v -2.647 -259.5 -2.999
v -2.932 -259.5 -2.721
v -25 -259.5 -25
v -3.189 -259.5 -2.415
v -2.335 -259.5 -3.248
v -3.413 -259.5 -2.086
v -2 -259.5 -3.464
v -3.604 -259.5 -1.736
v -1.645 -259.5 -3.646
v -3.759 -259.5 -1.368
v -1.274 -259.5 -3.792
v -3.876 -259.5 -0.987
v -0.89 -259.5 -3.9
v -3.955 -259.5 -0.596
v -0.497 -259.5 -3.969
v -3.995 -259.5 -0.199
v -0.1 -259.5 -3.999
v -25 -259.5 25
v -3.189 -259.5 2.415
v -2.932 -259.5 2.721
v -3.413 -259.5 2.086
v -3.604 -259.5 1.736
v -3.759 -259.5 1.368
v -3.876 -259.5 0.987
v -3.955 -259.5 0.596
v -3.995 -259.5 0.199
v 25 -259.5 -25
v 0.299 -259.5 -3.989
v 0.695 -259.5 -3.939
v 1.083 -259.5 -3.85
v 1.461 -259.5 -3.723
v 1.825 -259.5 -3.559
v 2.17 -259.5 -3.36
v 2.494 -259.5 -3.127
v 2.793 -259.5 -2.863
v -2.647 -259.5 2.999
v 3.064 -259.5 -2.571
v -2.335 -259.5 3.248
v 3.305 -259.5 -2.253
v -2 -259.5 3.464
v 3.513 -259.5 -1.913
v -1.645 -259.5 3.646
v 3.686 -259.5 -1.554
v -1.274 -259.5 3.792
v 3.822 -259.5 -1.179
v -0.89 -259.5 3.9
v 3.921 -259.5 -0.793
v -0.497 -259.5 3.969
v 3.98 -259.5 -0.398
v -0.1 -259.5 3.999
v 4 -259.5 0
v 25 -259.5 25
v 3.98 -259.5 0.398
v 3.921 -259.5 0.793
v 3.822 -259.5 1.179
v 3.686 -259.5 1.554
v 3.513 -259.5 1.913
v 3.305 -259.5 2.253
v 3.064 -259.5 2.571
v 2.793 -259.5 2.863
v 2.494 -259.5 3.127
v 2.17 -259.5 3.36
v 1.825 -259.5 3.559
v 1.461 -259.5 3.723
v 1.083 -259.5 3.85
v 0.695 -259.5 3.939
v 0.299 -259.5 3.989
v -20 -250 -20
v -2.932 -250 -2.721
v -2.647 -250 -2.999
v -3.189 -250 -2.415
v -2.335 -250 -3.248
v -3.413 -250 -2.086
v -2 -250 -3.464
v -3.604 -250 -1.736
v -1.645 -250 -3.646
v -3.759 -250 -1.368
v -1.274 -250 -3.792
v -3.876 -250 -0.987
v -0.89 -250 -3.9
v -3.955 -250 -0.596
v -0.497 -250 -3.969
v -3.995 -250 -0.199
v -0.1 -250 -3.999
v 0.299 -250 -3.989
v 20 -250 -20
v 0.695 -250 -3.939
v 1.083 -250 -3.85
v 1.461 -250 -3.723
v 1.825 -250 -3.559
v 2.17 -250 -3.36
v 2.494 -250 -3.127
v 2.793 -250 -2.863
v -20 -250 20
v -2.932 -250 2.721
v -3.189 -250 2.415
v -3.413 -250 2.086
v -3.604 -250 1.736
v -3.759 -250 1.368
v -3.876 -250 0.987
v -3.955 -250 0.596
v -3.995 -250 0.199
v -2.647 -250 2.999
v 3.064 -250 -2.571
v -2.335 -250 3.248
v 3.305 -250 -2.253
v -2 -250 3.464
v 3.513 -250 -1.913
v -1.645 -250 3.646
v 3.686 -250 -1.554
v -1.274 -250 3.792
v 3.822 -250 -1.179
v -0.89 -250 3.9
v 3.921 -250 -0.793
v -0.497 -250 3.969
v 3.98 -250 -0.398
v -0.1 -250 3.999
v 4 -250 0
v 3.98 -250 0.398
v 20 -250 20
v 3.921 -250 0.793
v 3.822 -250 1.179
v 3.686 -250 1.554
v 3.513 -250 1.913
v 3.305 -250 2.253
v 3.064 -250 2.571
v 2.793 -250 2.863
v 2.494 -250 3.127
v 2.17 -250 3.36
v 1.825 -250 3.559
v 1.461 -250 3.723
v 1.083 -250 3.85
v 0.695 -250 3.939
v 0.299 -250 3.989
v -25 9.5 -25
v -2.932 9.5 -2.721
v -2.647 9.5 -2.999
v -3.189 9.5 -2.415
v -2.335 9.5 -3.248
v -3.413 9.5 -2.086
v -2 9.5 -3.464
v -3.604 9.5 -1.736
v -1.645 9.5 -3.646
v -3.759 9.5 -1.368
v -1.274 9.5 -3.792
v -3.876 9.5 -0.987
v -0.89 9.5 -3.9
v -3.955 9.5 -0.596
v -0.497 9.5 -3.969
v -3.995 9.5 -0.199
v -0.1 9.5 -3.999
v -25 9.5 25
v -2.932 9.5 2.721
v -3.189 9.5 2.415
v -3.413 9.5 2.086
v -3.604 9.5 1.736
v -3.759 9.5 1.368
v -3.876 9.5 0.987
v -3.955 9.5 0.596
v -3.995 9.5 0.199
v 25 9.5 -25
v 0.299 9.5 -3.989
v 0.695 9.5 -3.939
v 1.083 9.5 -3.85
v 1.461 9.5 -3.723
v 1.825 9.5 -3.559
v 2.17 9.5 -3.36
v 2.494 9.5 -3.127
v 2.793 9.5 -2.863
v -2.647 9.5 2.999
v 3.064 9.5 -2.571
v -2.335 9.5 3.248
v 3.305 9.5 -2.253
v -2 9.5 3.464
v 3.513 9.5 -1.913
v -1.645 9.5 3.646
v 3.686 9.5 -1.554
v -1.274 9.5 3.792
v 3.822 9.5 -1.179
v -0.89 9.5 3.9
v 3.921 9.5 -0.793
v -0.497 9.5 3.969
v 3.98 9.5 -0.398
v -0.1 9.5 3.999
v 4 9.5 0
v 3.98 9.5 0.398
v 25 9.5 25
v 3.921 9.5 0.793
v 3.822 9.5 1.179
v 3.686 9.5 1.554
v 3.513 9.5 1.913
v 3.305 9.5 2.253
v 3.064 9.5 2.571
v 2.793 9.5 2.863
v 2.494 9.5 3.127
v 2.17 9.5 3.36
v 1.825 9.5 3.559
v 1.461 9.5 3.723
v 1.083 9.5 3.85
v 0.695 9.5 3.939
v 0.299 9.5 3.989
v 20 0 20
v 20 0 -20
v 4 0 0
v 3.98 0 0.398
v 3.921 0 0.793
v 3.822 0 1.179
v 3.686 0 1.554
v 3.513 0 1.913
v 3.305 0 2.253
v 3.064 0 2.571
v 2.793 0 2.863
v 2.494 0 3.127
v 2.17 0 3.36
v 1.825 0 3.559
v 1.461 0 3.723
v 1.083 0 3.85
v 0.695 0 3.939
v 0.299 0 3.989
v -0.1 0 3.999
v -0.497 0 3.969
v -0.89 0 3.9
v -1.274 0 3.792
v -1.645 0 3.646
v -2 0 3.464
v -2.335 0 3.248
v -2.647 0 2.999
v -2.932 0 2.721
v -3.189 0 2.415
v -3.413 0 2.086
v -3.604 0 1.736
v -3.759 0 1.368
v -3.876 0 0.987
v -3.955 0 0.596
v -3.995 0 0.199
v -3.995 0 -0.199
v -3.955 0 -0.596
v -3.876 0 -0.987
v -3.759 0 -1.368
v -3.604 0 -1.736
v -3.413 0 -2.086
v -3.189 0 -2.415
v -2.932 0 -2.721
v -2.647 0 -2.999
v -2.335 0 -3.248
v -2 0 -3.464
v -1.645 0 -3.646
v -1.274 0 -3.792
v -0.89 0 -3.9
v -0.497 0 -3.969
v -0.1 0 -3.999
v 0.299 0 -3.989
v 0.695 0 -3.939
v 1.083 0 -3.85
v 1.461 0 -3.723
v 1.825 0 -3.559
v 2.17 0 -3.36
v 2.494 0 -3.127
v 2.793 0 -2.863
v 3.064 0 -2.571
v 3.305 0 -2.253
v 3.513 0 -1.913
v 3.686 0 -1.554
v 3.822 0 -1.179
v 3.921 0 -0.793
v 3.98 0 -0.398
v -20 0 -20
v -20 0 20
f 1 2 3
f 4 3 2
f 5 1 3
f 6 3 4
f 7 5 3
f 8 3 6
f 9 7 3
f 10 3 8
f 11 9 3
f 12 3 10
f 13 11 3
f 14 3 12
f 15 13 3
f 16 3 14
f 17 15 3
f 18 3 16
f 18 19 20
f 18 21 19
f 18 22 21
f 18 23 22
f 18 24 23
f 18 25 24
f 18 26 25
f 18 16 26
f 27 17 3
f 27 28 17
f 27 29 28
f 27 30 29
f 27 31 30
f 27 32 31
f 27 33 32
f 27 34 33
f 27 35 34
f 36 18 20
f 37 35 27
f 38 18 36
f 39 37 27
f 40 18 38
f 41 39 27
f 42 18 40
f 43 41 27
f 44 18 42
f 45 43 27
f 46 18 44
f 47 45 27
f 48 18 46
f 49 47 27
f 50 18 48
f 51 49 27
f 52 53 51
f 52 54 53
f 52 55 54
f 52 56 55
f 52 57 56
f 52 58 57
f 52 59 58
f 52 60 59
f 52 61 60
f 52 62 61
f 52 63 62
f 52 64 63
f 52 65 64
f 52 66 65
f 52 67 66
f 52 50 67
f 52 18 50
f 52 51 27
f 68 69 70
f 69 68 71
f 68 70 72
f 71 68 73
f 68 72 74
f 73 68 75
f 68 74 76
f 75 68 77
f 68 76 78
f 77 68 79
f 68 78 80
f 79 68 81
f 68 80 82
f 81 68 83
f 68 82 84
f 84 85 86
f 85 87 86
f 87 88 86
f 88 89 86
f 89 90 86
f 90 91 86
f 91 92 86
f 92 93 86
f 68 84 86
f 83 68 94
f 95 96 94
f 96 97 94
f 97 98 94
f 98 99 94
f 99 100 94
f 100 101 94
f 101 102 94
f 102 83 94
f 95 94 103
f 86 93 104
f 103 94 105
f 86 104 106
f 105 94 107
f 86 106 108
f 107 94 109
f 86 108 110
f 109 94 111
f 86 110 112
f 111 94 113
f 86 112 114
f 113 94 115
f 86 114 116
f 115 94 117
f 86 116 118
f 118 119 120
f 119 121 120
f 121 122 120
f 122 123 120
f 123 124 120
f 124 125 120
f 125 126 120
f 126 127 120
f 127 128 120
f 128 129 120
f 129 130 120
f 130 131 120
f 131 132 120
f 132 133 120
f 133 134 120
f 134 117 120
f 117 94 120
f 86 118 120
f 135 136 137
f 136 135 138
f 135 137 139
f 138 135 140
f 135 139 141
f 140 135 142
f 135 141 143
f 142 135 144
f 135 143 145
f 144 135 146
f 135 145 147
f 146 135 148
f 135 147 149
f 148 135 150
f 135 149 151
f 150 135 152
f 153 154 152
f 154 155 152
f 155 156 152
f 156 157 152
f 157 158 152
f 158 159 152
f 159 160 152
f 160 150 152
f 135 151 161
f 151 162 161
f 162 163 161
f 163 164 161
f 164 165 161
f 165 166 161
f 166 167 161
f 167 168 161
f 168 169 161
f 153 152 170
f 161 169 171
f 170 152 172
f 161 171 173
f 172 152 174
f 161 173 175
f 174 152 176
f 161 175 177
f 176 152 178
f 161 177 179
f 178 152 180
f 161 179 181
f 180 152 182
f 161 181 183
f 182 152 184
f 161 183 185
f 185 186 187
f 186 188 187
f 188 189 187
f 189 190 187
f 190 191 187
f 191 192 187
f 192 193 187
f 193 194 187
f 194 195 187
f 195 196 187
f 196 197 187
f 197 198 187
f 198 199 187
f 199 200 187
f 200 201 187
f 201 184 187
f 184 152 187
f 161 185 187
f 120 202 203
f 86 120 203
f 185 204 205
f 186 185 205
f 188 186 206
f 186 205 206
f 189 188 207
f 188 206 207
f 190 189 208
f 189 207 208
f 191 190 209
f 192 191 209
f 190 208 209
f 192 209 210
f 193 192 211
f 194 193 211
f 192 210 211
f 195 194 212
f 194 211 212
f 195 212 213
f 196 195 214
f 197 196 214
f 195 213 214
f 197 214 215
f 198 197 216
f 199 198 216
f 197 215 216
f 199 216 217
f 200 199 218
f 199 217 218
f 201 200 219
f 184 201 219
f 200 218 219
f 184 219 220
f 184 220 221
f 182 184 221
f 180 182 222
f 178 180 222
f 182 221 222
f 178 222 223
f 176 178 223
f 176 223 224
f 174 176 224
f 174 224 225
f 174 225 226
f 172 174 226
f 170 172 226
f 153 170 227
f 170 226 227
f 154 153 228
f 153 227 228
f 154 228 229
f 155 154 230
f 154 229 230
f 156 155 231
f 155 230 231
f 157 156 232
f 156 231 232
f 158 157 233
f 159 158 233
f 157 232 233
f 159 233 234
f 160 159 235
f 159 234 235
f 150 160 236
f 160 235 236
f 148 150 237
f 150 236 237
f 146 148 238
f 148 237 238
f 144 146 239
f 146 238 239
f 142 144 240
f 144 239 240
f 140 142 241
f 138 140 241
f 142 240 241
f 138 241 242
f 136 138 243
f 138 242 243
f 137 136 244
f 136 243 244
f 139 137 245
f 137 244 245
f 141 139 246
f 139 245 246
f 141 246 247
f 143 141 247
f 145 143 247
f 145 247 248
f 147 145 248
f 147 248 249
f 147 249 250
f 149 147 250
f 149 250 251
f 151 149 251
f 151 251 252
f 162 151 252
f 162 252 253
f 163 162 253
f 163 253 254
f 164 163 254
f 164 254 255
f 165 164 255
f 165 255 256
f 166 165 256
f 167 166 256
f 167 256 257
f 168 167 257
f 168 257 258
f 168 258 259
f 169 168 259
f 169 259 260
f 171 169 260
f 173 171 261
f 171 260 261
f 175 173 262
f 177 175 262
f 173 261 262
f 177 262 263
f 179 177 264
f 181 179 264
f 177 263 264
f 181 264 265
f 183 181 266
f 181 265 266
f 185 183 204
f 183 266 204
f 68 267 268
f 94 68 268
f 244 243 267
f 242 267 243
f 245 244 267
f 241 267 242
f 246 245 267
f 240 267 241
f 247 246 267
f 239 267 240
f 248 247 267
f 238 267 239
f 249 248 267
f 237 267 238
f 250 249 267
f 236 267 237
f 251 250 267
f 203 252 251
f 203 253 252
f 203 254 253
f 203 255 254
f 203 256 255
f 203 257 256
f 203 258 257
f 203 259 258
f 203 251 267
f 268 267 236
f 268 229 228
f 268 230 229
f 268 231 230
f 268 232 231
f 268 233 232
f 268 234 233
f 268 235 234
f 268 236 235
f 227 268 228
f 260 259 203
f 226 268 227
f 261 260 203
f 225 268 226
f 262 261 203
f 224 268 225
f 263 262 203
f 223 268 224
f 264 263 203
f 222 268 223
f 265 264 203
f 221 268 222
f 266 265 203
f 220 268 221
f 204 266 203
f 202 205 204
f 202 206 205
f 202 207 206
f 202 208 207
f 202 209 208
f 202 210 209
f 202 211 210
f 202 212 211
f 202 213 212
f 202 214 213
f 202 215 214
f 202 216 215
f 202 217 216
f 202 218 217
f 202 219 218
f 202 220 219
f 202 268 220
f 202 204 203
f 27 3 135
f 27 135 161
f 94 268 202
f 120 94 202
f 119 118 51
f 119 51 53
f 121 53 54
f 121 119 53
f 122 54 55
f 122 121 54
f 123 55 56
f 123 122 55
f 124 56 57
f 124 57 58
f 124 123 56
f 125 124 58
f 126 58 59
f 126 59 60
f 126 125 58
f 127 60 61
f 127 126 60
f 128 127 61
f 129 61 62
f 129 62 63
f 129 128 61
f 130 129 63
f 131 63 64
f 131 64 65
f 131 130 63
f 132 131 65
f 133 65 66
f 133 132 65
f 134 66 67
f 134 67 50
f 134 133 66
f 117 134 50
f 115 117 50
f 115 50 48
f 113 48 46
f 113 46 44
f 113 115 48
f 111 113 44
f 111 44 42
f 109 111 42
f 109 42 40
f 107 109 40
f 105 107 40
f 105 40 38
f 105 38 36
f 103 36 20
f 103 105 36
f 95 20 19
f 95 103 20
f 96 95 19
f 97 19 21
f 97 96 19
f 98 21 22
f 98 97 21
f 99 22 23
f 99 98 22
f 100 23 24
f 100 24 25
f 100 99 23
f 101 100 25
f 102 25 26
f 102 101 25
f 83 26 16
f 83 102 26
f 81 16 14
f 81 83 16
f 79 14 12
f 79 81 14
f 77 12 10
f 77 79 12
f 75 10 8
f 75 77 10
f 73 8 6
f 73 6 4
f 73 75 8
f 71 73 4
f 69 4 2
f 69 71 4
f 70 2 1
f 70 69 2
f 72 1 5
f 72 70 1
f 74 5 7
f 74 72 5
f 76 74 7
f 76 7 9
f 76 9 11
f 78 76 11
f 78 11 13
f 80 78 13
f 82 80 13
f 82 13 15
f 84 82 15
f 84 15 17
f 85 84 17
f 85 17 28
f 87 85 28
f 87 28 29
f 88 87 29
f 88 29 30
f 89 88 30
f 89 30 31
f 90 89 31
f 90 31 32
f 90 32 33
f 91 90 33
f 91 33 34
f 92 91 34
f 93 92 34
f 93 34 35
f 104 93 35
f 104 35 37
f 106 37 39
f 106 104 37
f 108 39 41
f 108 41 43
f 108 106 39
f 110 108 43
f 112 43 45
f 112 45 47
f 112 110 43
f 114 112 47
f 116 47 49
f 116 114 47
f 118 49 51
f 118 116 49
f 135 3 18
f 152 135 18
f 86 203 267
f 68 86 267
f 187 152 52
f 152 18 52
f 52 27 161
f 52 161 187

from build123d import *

# Parameters (mm, degrees)
F1_DEPTH = 250
F2_W     = 50
F2_H     = 50
F2_R     = 4
F3_DEPTH = 9.5
F4_W     = 50
F4_H     = 50
F4_R     = 4
F5_DEPTH = 9.5


with BuildPart() as f1:
    # F0 (on Front) → F1 (new body)
    with BuildSketch(Plane.XZ):
        Polygon((25, -25), (25, 0), (25, 25), (-25, 25), (-25, -25), align=None)
        Polygon((20, -20), (0, -20), (-20, -20), (-20, 20), (20, 20), align=None, mode=Mode.SUBTRACT)
    extrude(amount=F1_DEPTH)

    # F2 (on face) → F3 (join)
    with BuildSketch(Plane.XZ.offset(250)):
        Rectangle(F2_W, F2_H)
        Circle(F2_R, mode=Mode.SUBTRACT)
    extrude(amount=F3_DEPTH)

    # F4 (on face) → F5 (join)
    with BuildSketch(Plane.XZ):
        Rectangle(F4_W, F4_H)
        Circle(F4_R, mode=Mode.SUBTRACT)
    extrude(amount=-F5_DEPTH)


solid = f1.part
